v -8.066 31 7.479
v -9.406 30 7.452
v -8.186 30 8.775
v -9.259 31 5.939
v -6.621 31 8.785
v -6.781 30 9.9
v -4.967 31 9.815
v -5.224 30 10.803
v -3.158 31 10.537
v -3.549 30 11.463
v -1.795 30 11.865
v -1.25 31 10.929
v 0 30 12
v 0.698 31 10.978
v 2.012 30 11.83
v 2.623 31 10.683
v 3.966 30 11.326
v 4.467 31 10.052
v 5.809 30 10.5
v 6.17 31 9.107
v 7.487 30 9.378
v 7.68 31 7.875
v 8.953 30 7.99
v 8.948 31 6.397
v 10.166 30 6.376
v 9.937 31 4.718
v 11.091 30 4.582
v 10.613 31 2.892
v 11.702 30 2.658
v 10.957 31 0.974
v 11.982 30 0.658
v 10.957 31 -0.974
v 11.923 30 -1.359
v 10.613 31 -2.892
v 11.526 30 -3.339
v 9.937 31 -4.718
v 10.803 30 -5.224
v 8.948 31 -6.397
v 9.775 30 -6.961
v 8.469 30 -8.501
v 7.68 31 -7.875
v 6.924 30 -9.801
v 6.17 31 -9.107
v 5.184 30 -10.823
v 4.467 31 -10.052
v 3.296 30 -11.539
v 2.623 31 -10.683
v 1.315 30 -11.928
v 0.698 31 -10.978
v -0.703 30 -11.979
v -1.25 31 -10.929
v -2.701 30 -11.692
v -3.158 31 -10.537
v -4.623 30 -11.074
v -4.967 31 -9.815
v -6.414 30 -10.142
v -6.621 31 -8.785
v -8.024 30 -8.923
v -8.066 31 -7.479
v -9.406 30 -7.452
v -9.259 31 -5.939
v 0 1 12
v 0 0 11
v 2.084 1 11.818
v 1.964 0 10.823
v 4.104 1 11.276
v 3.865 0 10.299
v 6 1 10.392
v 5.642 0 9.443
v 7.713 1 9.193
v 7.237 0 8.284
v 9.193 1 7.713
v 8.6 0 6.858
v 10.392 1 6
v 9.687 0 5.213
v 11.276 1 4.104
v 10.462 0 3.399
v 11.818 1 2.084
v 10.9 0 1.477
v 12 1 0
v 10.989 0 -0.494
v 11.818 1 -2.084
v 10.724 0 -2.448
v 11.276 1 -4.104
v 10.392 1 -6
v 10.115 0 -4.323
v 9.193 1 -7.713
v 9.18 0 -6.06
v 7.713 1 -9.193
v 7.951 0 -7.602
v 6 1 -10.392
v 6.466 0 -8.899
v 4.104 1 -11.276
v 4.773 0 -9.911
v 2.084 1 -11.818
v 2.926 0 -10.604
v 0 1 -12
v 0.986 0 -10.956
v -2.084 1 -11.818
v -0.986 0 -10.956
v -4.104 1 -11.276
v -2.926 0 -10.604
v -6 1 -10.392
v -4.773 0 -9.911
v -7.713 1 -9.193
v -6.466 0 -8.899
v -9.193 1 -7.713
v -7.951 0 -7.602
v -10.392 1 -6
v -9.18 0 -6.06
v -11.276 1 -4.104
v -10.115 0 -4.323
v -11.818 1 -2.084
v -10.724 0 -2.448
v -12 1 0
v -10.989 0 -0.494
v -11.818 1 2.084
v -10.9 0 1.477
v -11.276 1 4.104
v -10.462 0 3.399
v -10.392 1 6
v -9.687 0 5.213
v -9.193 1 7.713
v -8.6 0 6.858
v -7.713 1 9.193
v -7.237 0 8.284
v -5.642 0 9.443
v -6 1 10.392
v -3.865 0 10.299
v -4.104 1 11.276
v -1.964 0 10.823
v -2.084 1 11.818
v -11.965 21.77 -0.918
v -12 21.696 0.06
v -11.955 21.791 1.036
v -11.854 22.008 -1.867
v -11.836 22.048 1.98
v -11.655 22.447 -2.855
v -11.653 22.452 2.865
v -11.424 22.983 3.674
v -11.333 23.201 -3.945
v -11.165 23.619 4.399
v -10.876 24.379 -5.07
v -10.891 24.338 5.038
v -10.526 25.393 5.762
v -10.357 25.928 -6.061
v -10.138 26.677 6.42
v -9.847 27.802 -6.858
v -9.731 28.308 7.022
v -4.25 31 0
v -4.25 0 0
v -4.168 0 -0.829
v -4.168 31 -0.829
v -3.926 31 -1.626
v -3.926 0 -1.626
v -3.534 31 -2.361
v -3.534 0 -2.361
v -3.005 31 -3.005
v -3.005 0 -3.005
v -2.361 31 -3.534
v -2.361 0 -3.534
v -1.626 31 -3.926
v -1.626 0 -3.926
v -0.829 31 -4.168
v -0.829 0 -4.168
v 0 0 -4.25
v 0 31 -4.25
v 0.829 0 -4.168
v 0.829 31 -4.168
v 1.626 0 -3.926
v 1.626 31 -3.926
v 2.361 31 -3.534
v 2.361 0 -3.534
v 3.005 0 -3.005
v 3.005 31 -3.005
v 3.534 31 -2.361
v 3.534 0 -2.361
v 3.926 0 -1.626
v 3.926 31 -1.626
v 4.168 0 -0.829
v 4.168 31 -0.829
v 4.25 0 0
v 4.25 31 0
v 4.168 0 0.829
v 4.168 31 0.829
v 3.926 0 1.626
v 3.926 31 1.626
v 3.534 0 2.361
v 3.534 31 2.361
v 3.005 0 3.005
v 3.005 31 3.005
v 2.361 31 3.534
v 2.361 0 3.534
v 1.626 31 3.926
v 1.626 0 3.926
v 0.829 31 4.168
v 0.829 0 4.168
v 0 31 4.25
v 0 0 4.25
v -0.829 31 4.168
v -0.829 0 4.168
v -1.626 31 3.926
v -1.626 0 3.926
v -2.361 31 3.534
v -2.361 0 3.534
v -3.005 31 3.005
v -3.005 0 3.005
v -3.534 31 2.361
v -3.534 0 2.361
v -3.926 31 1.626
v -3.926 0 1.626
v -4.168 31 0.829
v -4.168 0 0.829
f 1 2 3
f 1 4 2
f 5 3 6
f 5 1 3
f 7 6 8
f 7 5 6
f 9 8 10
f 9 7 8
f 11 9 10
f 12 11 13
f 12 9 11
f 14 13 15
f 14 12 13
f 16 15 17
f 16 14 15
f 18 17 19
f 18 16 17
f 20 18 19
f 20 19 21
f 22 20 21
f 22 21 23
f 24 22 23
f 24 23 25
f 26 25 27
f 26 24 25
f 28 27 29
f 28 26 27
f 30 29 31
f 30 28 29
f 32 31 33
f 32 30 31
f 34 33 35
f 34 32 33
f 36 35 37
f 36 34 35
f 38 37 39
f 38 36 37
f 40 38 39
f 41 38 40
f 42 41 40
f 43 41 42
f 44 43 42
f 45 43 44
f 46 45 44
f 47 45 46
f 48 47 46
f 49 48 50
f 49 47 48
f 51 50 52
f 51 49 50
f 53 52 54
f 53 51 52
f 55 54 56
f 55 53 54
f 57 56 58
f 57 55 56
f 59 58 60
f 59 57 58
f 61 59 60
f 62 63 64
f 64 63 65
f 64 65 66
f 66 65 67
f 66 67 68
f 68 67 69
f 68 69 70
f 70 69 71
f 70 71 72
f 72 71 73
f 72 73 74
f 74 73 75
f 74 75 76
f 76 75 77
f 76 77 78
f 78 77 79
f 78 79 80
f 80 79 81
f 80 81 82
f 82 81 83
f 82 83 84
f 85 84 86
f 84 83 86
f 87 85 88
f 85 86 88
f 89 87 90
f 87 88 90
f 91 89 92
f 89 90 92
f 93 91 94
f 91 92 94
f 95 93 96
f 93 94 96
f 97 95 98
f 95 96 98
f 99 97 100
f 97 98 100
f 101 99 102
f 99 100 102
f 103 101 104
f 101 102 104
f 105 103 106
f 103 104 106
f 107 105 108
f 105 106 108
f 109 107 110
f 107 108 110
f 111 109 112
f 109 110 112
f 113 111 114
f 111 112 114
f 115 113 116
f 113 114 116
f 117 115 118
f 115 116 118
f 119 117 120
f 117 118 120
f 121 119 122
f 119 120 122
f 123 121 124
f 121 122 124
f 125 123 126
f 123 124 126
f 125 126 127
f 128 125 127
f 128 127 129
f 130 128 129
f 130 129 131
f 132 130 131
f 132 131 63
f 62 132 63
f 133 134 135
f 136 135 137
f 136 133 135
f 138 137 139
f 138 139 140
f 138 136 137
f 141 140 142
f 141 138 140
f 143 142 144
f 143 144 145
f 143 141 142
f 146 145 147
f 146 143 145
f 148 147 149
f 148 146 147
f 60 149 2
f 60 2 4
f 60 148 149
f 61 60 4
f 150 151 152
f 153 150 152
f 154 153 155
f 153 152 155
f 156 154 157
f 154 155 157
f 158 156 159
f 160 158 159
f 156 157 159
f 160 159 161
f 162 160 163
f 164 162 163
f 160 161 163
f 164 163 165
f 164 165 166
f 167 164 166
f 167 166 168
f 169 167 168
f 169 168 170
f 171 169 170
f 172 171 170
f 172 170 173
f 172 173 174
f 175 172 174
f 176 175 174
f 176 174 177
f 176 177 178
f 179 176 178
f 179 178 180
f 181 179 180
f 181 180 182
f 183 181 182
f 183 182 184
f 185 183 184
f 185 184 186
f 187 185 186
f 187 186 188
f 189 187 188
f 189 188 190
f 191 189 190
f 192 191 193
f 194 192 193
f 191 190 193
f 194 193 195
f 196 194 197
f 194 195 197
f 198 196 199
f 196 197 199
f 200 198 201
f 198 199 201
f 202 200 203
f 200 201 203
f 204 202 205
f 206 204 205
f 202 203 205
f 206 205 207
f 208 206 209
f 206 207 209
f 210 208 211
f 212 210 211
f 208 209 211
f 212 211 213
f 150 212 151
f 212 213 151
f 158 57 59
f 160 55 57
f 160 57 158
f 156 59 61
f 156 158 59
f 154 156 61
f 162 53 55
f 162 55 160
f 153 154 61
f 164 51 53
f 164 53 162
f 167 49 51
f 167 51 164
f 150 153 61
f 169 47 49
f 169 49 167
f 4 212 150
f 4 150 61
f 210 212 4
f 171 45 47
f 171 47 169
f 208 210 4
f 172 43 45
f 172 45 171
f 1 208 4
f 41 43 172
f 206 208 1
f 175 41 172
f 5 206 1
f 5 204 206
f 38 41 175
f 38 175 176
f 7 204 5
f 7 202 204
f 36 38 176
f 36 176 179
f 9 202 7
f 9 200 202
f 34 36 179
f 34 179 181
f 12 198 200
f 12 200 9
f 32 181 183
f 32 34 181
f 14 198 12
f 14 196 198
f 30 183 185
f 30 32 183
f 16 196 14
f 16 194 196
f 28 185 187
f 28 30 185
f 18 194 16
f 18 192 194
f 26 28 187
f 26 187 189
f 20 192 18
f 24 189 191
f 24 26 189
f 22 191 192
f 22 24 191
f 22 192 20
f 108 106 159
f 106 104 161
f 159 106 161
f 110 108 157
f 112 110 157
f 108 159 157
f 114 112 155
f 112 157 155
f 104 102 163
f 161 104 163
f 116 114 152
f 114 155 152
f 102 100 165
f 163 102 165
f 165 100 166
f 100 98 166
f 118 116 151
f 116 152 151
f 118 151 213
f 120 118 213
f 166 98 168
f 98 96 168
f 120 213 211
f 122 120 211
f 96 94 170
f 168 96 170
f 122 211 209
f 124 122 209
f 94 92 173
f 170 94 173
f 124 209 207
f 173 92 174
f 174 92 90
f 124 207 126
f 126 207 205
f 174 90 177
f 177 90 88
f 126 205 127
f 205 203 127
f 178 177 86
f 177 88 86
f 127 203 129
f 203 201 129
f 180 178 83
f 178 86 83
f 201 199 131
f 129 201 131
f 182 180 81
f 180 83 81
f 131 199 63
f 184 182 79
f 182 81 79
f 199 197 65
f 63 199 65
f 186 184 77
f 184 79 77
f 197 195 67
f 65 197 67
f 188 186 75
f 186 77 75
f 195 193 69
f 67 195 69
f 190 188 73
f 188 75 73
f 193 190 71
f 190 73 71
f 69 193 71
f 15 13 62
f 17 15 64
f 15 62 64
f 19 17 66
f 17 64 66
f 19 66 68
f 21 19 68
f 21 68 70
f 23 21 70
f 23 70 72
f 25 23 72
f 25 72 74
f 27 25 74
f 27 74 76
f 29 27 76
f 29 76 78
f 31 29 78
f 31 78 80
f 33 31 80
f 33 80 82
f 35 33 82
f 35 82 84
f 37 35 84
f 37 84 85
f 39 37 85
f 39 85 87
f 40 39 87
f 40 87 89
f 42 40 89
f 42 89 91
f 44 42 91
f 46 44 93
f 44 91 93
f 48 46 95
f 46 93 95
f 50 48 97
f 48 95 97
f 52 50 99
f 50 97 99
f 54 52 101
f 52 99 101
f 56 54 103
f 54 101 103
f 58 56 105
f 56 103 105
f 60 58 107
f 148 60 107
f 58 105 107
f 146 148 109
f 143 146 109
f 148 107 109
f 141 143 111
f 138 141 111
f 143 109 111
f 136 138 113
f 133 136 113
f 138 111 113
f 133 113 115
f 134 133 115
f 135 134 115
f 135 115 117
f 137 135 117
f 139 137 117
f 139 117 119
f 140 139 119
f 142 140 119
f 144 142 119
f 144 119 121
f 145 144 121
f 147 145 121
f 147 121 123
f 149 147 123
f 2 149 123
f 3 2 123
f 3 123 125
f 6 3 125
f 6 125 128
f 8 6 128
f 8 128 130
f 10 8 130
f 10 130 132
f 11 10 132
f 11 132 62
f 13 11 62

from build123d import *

# Parameters (mm, degrees)
SKETCH_1_R               = 12
EXTRUDE_1_DEPTH          = 31
HOLE_WIZARD_M10_1_D      = 8.5
CHAMFER_1_SIZE           = 1
CUT_EXTRUDE_1_DEPTH      = 36.341194094
CUT_EXTRUDE_1_DEPTH_BACK = 36.341194094
SKETCH_5_R               = 31


with BuildPart() as part:
    # 草图1 → 凸台-拉伸1 (new body)
    with BuildSketch(Plane(origin=(0, 0, 0), x_dir=(1, 0, 0), z_dir=(0, 1, 0))):
        with Locations(Location((0, 0, 0), (0, 0, 270))):
            Circle(SKETCH_1_R)
    extrude(amount=EXTRUDE_1_DEPTH)

    # M10 螺纹孔1 (through all)
    with Locations(Plane(origin=(0, 31, 0), x_dir=(1, 0, 0), z_dir=(0, 1, 0))):
        with Locations((0, 0)):
            Hole(HOLE_WIZARD_M10_1_D / 2)

    # 倒角1
    chamfer_1_edges = [part.edges().sort_by_distance(p)[0] for p in [
        (0, 0, -12),
        (0, 31, -12),
    ]]
    chamfer(chamfer_1_edges, length=CHAMFER_1_SIZE)

    # 草图5 → 切除-拉伸1 (cut, two sides: drawn at the far end of the back side and taken through both)
    with BuildSketch(Plane.XY.offset(-CUT_EXTRUDE_1_DEPTH_BACK)):
        with Locations((-40, 35)):
            Circle(SKETCH_5_R)
    extrude(amount=CUT_EXTRUDE_1_DEPTH + CUT_EXTRUDE_1_DEPTH_BACK, mode=Mode.SUBTRACT)


solid = part.part
